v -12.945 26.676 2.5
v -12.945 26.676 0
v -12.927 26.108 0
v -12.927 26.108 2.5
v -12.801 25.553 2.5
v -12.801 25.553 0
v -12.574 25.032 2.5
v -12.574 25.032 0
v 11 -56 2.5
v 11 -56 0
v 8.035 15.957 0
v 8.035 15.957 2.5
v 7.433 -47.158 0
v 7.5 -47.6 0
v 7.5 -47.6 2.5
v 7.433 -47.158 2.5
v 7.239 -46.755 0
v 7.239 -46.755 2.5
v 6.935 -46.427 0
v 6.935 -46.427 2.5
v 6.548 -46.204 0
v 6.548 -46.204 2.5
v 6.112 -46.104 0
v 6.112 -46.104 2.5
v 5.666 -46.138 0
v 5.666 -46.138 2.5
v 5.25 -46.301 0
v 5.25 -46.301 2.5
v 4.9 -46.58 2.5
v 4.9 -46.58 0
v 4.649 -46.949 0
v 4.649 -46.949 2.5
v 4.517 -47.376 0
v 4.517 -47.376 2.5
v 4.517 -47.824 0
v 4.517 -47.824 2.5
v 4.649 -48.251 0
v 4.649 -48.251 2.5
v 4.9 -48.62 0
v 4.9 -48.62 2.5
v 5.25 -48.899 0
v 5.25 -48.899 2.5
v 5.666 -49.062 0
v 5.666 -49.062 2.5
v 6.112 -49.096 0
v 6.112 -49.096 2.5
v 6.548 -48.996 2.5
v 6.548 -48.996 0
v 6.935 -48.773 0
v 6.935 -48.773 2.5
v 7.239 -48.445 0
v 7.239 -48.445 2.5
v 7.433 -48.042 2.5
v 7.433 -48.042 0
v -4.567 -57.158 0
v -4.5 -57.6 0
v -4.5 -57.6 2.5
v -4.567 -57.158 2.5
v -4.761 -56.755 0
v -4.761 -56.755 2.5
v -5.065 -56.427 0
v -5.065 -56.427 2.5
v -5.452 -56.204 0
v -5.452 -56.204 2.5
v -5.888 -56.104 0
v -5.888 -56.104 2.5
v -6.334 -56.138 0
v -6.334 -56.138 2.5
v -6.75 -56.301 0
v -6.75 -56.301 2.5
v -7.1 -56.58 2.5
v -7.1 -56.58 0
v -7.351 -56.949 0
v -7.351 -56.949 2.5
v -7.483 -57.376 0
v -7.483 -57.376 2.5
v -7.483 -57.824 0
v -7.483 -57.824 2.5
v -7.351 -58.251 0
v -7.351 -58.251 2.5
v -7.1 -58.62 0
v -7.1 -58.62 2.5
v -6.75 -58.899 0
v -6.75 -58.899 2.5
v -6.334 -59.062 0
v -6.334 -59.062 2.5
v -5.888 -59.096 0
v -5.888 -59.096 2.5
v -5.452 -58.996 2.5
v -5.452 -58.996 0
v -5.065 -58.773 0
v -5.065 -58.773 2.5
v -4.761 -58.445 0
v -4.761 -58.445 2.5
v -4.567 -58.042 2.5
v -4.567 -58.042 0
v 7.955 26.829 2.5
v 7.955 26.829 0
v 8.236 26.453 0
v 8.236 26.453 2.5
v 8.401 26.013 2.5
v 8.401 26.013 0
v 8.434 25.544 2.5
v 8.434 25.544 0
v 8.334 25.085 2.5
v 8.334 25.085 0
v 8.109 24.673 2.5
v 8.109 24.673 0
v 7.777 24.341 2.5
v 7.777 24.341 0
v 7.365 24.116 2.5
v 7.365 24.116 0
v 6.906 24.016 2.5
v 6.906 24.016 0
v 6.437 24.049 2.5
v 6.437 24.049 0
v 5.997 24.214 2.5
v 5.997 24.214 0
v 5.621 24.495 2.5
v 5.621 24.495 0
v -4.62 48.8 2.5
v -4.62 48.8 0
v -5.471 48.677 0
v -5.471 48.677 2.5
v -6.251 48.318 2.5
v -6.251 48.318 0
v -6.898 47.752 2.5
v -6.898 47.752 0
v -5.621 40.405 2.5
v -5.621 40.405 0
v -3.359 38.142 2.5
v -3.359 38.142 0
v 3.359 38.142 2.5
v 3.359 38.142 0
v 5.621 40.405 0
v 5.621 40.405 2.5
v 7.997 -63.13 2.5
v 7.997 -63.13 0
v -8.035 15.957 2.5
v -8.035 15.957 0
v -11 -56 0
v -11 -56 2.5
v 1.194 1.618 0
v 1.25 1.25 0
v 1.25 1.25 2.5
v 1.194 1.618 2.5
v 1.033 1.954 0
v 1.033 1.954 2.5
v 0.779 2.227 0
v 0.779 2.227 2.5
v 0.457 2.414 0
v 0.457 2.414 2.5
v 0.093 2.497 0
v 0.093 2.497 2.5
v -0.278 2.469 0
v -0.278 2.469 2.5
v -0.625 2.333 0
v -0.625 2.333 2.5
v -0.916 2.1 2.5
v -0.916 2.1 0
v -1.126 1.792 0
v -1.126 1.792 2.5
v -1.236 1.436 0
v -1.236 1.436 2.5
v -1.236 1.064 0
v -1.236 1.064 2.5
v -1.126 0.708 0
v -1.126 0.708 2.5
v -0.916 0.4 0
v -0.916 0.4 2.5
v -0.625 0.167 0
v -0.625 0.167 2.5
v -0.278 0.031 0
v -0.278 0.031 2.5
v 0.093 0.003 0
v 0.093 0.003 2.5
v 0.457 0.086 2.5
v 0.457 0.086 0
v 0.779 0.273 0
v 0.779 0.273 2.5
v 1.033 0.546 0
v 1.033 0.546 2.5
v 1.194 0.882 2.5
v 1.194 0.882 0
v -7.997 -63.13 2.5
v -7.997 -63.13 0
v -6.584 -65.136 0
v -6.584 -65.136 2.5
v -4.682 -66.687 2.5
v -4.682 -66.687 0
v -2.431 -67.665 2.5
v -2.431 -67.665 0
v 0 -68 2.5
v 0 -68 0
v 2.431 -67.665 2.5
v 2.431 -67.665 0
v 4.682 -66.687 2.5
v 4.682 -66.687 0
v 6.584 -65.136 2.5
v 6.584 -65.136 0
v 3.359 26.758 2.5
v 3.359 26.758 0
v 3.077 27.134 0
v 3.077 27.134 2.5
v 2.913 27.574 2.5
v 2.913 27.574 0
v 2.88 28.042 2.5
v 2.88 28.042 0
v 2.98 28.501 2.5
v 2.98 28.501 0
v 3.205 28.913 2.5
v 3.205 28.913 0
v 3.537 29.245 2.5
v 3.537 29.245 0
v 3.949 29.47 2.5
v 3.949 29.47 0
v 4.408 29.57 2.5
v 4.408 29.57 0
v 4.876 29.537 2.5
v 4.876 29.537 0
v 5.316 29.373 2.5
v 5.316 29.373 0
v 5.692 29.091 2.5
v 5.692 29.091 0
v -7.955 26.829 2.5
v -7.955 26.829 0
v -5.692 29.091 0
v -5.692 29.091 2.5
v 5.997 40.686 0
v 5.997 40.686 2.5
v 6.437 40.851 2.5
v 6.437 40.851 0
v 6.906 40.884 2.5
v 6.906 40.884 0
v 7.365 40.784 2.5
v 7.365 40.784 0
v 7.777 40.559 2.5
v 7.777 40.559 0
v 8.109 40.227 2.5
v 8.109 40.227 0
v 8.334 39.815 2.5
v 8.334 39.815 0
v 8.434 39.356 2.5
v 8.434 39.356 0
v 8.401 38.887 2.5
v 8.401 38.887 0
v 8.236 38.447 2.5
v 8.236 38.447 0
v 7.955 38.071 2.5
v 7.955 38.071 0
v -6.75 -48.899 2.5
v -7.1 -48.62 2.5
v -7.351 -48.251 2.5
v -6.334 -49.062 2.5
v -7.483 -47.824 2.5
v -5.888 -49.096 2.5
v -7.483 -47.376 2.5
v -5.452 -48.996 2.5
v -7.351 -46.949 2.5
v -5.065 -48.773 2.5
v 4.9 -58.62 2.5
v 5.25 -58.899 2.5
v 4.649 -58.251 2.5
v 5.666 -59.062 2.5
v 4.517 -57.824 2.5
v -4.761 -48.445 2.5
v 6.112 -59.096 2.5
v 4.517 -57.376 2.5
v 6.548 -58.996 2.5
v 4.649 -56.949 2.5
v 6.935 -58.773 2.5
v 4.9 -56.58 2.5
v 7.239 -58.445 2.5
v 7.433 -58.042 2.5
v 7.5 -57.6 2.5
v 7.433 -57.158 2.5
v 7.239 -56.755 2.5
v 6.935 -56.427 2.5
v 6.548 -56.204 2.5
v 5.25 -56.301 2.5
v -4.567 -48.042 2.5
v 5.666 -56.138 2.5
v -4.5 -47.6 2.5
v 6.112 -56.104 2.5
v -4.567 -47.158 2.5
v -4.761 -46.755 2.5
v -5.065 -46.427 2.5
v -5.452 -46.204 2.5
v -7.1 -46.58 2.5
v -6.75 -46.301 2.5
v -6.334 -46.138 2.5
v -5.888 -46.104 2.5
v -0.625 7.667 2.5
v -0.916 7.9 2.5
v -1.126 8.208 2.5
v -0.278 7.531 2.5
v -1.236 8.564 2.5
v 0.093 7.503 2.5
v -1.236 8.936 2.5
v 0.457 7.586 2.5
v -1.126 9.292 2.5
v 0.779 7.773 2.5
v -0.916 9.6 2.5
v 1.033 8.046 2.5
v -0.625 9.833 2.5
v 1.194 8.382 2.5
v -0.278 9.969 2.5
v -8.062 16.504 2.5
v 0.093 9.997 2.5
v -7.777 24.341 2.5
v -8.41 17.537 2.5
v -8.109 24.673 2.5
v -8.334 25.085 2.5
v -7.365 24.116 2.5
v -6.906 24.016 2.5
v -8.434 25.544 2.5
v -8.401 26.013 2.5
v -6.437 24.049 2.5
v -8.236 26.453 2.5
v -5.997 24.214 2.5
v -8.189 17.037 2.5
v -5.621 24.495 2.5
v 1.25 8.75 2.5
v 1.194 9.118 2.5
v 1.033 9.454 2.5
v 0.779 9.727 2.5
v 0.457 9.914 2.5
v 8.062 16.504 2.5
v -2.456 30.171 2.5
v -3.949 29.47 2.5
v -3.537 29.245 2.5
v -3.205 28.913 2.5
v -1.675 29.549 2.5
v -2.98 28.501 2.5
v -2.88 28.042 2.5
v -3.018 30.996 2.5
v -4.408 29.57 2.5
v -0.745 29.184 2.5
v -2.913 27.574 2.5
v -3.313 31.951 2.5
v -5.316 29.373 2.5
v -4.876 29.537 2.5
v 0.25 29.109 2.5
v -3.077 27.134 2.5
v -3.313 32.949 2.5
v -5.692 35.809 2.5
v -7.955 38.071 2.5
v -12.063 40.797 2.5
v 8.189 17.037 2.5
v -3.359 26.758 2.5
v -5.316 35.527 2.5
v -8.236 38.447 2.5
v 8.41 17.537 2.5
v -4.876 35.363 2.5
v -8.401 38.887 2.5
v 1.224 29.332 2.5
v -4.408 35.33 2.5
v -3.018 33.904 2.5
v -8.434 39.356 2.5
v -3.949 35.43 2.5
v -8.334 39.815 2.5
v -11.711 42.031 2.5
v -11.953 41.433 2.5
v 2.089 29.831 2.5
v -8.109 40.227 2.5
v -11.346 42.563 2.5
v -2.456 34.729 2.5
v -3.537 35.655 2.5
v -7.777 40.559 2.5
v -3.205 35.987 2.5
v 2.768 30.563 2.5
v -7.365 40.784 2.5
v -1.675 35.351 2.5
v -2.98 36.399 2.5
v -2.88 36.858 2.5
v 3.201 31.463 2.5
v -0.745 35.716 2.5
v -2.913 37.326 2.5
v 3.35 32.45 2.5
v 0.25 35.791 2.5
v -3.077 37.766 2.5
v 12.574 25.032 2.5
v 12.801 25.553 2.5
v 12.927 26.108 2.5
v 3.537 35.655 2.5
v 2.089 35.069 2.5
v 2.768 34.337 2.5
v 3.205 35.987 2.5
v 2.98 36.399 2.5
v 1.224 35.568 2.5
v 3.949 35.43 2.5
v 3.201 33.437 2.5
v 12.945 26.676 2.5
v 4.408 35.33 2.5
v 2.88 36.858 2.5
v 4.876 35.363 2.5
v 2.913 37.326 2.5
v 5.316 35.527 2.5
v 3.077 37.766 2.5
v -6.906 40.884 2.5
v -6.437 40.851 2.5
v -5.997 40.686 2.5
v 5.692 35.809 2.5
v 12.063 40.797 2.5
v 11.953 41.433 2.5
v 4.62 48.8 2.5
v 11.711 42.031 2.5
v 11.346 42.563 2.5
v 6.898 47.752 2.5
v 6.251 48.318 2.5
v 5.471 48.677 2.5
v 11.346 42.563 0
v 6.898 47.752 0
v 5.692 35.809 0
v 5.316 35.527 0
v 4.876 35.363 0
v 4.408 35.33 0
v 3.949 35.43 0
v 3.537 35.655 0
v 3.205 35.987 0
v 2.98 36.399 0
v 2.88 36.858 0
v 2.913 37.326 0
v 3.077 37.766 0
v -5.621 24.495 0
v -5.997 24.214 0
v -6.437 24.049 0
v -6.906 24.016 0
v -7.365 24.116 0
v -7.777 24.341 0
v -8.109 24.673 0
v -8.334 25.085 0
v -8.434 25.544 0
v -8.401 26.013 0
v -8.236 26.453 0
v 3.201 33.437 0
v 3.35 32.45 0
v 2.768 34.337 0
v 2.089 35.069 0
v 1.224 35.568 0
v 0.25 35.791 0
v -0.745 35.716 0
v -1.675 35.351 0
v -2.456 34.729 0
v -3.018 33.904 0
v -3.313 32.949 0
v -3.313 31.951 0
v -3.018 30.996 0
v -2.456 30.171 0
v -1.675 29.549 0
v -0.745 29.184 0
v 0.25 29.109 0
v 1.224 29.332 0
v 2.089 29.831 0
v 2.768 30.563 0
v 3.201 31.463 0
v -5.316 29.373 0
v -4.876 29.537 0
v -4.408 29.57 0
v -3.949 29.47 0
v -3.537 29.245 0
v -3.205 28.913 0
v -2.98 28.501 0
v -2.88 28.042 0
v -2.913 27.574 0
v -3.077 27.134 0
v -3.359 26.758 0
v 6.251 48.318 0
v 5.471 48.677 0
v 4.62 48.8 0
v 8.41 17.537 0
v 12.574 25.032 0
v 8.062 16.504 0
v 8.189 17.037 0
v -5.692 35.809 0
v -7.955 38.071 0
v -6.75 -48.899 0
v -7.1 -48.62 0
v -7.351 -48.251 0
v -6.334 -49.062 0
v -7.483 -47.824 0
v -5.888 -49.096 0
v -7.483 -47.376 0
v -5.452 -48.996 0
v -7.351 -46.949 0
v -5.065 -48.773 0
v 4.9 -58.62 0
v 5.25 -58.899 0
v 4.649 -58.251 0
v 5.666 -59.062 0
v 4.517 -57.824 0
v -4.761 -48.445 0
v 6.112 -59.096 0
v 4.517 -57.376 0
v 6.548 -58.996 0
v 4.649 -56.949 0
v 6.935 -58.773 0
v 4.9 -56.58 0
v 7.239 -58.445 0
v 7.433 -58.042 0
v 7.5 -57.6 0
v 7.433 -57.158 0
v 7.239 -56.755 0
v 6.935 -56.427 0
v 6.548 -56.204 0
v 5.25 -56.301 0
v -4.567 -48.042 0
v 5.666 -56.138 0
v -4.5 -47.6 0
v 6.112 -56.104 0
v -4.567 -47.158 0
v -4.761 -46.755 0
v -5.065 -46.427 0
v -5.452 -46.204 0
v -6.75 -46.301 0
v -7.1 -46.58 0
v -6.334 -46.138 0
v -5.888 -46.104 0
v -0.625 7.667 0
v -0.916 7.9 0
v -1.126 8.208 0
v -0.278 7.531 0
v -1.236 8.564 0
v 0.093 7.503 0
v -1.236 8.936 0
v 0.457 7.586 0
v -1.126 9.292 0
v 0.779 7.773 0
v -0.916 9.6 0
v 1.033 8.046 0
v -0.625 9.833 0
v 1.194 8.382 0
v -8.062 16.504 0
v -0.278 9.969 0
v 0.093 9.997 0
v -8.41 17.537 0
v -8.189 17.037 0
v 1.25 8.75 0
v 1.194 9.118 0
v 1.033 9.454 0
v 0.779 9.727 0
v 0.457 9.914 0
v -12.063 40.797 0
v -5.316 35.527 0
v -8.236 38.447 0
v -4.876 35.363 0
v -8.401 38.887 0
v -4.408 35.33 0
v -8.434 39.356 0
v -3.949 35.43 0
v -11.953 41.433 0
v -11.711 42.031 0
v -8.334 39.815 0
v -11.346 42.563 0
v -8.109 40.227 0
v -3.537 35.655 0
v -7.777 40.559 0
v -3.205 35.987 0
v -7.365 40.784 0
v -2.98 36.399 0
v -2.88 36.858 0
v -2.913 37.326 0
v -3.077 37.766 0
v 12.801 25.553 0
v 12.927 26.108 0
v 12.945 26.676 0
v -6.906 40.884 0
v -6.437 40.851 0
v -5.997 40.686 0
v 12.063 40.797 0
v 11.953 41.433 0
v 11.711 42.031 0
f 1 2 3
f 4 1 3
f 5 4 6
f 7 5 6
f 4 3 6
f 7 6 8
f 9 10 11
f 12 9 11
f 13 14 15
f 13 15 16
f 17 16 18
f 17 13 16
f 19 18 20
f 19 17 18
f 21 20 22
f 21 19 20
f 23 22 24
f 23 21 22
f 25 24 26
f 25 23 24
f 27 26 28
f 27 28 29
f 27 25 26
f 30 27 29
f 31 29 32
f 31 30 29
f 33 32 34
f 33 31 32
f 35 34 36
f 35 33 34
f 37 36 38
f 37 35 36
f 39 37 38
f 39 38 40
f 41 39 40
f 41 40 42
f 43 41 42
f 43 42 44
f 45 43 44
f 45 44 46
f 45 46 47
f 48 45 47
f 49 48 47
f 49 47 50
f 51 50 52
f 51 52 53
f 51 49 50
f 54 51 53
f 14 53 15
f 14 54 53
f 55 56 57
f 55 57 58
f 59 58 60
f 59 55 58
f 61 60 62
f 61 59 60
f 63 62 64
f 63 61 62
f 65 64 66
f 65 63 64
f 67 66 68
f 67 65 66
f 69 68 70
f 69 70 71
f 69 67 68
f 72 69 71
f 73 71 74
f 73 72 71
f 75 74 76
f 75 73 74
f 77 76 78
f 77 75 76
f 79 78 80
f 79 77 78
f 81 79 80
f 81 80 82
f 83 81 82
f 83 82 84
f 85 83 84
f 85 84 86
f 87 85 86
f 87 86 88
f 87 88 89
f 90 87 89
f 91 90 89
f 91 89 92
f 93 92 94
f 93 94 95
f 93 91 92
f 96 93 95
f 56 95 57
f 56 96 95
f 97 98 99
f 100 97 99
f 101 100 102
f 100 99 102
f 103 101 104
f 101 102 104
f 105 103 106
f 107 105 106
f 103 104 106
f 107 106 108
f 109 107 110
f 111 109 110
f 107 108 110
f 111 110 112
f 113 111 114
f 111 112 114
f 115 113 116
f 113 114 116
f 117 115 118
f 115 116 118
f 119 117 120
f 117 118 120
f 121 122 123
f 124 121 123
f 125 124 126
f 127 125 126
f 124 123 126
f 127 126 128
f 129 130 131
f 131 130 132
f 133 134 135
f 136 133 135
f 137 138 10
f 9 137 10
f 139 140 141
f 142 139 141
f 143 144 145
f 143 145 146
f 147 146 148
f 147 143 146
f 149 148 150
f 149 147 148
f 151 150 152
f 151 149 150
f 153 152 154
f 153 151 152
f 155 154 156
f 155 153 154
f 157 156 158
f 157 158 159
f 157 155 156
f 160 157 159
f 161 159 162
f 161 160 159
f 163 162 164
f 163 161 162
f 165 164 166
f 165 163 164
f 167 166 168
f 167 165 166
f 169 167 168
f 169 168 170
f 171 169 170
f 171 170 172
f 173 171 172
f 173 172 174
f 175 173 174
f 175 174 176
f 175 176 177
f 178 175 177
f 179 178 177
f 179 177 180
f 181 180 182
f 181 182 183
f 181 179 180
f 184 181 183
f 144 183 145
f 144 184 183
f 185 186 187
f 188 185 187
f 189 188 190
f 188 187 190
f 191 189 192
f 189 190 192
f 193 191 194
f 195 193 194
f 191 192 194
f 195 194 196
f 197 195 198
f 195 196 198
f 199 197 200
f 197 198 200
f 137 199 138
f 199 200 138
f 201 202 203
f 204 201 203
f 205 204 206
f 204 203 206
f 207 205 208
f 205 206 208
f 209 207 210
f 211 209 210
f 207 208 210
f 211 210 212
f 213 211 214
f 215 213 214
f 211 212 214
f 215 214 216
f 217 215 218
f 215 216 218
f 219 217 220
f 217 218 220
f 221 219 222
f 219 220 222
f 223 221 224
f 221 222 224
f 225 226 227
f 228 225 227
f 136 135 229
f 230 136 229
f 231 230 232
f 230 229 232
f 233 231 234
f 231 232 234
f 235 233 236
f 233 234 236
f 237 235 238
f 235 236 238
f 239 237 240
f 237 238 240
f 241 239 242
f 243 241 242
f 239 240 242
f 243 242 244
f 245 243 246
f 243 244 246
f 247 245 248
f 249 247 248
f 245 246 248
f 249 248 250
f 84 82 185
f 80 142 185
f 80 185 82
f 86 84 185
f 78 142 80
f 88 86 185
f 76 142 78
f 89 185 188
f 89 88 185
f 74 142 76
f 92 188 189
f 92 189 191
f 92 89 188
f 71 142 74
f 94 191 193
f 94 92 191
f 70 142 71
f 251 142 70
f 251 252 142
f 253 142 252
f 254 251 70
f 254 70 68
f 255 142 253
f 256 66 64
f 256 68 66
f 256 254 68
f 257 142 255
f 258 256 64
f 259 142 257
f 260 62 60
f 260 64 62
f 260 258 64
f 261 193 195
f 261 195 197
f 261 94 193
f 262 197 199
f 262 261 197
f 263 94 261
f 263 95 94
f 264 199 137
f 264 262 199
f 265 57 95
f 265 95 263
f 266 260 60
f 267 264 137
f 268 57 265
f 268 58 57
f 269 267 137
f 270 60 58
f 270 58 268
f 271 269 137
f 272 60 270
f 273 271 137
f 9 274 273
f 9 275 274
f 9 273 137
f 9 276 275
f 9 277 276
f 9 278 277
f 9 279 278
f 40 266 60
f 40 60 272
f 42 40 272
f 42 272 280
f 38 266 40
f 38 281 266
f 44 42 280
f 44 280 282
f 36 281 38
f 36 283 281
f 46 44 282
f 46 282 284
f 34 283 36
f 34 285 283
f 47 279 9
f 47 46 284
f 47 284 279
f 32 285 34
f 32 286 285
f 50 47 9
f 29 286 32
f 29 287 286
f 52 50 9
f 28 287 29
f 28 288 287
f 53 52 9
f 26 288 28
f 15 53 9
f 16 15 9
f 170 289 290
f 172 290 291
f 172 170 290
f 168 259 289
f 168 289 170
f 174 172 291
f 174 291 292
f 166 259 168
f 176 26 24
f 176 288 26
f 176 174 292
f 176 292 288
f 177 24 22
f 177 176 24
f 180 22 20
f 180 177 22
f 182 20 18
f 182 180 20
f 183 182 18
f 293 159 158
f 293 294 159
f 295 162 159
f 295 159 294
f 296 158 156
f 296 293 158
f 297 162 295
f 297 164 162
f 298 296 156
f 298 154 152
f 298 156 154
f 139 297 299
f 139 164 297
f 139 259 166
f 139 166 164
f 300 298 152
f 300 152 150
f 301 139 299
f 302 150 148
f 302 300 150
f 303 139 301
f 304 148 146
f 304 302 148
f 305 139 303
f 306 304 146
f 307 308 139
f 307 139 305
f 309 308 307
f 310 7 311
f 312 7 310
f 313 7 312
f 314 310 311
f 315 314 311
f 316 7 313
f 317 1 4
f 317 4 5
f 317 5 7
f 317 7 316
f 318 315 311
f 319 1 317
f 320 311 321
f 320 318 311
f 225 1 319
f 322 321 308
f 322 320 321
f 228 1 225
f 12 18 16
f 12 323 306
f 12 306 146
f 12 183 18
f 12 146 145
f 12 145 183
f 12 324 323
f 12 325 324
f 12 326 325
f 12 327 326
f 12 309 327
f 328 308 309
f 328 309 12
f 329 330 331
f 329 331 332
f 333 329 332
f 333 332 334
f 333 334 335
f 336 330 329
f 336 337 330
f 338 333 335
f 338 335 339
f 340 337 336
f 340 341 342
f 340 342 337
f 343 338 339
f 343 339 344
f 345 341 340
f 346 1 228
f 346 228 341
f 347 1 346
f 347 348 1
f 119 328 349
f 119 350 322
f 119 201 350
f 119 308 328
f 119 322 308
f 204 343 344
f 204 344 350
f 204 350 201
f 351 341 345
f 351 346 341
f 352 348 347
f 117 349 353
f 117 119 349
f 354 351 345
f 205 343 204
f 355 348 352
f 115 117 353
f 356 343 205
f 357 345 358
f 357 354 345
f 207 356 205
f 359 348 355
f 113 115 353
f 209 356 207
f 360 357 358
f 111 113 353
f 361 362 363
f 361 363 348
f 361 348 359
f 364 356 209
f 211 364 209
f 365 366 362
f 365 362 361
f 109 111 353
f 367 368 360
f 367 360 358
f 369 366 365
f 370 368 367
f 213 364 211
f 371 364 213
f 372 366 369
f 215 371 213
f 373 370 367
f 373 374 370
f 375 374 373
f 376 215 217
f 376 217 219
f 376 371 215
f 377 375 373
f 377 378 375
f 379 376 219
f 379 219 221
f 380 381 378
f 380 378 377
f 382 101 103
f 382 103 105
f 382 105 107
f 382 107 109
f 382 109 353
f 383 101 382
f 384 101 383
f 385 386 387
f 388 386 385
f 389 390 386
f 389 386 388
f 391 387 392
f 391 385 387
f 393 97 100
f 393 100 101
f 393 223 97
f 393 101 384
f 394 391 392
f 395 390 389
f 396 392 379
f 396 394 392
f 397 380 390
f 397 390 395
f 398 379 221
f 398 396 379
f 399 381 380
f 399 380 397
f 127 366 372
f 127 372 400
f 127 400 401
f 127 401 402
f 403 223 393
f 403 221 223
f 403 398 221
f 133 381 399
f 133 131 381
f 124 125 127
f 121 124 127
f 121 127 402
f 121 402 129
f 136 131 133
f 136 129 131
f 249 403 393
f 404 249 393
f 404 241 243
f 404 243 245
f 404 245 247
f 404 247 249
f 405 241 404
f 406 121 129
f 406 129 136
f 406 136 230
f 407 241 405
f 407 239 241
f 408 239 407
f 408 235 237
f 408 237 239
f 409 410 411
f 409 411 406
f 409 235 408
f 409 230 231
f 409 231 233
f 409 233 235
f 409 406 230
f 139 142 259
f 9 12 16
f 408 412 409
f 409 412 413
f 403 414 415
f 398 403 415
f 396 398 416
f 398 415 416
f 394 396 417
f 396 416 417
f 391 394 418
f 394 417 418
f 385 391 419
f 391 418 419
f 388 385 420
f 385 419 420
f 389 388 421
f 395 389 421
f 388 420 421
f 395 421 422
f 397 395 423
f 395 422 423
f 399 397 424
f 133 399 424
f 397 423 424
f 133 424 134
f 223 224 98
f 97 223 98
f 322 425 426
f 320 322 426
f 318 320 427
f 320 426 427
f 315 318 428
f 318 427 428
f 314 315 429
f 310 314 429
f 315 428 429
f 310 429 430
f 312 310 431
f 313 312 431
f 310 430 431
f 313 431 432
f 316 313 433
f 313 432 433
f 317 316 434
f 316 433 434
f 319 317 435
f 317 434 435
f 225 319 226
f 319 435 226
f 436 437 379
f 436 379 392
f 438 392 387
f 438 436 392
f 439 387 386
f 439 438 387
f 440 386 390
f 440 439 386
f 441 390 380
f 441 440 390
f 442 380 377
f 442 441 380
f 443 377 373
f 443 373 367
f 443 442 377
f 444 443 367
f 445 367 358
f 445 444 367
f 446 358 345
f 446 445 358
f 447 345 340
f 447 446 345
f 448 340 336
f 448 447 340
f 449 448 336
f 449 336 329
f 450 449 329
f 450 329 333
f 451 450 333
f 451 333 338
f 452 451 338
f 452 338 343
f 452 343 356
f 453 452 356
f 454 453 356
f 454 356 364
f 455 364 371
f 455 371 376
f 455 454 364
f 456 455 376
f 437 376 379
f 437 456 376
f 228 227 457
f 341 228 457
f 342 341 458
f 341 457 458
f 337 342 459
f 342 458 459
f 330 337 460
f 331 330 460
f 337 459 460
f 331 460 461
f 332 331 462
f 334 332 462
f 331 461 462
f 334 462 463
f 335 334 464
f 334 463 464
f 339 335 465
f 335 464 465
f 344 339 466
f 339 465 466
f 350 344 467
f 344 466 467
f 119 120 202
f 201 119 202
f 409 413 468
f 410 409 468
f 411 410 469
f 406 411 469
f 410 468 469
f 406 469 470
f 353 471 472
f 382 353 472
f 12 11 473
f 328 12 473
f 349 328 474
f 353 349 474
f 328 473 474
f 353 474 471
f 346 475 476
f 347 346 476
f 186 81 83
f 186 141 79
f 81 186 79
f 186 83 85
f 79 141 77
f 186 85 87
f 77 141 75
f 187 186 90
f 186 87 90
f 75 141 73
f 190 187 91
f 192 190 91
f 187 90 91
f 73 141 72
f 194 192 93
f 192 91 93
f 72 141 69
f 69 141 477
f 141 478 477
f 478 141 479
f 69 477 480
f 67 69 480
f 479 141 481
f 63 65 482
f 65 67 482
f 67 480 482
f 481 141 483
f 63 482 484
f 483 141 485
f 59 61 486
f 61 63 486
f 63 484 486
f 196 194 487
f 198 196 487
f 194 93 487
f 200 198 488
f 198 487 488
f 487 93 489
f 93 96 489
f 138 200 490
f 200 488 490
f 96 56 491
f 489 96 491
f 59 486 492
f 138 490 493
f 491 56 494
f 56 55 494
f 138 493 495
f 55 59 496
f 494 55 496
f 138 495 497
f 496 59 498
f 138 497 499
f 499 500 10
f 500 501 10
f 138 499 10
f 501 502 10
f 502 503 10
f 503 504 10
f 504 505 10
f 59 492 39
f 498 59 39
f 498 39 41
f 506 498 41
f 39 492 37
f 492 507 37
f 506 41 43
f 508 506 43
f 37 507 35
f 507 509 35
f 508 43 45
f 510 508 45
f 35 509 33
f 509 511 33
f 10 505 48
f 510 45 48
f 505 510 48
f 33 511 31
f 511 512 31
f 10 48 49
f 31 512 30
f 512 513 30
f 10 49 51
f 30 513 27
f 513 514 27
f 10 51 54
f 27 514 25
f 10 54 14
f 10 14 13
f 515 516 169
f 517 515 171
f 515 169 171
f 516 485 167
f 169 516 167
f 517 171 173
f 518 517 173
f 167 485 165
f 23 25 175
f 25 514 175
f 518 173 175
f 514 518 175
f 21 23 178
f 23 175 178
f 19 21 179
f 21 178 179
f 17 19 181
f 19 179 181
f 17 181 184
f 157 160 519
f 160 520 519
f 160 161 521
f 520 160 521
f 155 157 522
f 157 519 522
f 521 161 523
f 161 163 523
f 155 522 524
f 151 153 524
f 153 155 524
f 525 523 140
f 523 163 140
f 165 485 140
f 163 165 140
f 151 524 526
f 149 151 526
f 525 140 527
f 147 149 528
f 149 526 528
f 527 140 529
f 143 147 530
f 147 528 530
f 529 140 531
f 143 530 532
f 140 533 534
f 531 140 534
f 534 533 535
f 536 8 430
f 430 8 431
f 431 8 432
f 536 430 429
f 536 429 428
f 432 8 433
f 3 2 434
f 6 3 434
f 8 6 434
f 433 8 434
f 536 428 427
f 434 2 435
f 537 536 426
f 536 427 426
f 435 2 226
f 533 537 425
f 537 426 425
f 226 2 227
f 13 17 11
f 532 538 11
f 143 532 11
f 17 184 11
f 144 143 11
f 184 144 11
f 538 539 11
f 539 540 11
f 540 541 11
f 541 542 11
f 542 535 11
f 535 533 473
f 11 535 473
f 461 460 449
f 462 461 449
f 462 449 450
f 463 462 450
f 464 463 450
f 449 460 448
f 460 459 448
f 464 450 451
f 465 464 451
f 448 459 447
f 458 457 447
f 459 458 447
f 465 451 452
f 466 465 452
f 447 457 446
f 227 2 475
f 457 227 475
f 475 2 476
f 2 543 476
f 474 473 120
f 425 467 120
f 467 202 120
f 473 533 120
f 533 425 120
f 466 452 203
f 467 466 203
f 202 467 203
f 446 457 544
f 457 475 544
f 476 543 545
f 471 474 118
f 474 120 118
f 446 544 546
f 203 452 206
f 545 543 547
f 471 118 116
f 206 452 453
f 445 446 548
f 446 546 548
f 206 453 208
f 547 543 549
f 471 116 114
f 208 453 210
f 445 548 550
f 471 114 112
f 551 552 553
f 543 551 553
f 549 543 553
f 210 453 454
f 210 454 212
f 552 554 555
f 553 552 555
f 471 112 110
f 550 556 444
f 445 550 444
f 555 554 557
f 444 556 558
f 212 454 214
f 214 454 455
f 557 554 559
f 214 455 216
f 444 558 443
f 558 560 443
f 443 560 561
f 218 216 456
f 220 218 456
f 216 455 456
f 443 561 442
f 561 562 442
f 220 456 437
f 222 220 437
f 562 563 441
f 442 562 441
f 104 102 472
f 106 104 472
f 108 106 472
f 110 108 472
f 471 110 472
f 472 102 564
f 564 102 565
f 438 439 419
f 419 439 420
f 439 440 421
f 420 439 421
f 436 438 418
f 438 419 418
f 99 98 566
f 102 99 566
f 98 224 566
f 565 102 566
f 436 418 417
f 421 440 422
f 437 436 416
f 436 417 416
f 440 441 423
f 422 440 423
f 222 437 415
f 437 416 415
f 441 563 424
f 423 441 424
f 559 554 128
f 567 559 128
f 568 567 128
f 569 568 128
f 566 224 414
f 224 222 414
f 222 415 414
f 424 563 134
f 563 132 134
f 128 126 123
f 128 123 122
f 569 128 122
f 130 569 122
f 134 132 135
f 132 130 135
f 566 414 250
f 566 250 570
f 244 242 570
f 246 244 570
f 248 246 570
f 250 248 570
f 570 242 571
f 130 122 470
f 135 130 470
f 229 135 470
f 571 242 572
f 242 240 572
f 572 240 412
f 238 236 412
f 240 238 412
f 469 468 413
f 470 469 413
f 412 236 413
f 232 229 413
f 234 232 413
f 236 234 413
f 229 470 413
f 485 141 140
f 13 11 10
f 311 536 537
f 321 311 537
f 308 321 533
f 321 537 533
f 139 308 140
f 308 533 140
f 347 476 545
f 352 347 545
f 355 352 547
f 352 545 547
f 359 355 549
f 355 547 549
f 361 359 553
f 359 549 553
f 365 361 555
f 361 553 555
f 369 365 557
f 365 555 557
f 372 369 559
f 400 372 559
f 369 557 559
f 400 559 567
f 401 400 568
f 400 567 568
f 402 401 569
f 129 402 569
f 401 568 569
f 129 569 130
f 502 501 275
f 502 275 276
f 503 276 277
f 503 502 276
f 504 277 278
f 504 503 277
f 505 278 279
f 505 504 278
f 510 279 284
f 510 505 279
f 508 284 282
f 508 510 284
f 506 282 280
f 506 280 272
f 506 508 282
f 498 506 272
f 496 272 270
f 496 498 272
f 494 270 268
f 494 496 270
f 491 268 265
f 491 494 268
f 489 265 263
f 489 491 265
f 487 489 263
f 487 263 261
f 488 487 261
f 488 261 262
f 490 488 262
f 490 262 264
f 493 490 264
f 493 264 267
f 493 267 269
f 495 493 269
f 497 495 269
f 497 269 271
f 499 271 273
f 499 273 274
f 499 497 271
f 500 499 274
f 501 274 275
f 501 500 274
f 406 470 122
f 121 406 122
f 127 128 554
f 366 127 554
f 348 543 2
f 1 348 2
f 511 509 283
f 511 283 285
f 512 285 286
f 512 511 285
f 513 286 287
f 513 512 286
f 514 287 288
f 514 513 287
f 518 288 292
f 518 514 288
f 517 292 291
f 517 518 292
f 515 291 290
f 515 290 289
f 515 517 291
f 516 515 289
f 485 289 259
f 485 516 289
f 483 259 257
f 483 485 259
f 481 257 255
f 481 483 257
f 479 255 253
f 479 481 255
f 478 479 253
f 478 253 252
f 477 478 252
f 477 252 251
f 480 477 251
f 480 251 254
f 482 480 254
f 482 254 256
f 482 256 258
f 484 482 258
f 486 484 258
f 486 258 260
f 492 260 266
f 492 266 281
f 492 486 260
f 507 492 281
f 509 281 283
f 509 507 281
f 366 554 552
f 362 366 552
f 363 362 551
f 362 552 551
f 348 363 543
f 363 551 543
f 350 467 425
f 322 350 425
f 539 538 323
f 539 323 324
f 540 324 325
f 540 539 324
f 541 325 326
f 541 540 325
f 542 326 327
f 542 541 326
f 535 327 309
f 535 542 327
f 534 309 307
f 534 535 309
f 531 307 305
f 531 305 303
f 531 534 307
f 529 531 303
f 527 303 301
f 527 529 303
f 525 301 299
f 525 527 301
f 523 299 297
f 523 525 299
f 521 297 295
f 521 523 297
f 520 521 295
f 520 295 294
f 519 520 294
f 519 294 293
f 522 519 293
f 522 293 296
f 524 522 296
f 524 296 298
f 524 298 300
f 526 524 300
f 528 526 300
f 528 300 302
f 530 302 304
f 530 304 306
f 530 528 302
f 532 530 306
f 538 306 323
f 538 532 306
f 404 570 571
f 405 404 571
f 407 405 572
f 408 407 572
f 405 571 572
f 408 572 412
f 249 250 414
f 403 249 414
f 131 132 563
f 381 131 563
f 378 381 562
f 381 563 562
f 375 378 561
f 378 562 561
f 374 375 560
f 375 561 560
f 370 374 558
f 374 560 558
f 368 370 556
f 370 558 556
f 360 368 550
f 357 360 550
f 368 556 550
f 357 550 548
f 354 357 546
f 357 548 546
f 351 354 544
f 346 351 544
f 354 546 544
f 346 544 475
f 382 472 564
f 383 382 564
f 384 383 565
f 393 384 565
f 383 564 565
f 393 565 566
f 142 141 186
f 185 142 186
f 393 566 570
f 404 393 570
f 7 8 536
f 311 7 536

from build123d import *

# Parameters (mm, degrees)
F0_R     = 1.5
F0_R_2   = 1.25
F0_R_3   = 3.35
F1_DEPTH = 2.5


with BuildPart() as f1:
    # F0 (on Top) → F1 (new body)
    with BuildSketch(Plane.XY):
        with BuildLine():
            Line((-8.0347370397, 15.957047836), (-11, -56))
            Line((-11, -56), (-7.9966708881, -63.1295586577))
            ThreePointArc((-7.9966708881, -63.1295586577), (0, -68), (7.9966708881, -63.1295586577))
            Line((7.9966708881, -63.1295586577), (11, -56))
            Line((11, -56), (8.0347370397, 15.957047836))
            ThreePointArc((8.0347370397, 15.957047836), (8.1132286629, 16.7731349004), (8.4097212043, 17.5374981677))
            Line((8.4097212043, 17.5374981677), (12.5735371817, 25.0323669271))
            ThreePointArc((12.5735371817, 25.0323669271), (12.8772178164, 25.8277582971), (12.9452230888, 26.6764305791))
            Line((12.9452230888, 26.6764305791), (12.0626597761, 40.7974435824))
            ThreePointArc((12.0626597761, 40.7974435824), (11.8483082239, 41.738438851), (11.3462718477, 42.5626828443))
            Line((11.3462718477, 42.5626828443), (6.8979650397, 47.7523741204))
            ThreePointArc((6.8979650397, 47.7523741204), (5.8737656612, 48.5255386955), (4.6201952326, 48.8))
            Line((4.6201952326, 48.8), (-4.6201952326, 48.8))
            ThreePointArc((-4.6201952326, 48.8), (-5.8737656612, 48.5255386955), (-6.8979650397, 47.7523741204))
            Line((-6.8979650397, 47.7523741204), (-11.3462718477, 42.5626828443))
            ThreePointArc((-11.3462718477, 42.5626828443), (-11.8483082239, 41.738438851), (-12.0626597761, 40.7974435824))
            Line((-12.0626597761, 40.7974435824), (-12.9452230888, 26.6764305791))
            ThreePointArc((-12.9452230888, 26.6764305791), (-12.8772178164, 25.8277582971), (-12.5735371817, 25.0323669271))
            Line((-12.5735371817, 25.0323669271), (-8.4097212043, 17.5374981677))
            ThreePointArc((-8.4097212043, 17.5374981677), (-8.1132286629, 16.7731349004), (-8.0347370397, 15.957047836))
        make_face()
        with Locations((-6, -57.6)):
            Circle(F0_R, mode=Mode.SUBTRACT)
        with Locations((-6, -47.6)):
            Circle(F0_R, mode=Mode.SUBTRACT)
        with Locations((6, -57.6)):
            Circle(F0_R, mode=Mode.SUBTRACT)
        with Locations((6, -47.6)):
            Circle(F0_R, mode=Mode.SUBTRACT)
        with Locations((0, 1.25)):
            Circle(F0_R_2, mode=Mode.SUBTRACT)
        with Locations((0, 8.75)):
            Circle(F0_R_2, mode=Mode.SUBTRACT)
        with BuildLine():
            Line((-7.9549512883, 26.8285010896), (-5.6922095886, 29.0912427894))
            ThreePointArc((-5.6922095886, 29.0912427894), (-3.3587572106, 29.0912427894), (-3.3587572106, 26.7577904114))
            Line((-3.3587572106, 26.7577904114), (-5.6214989104, 24.4950487117))
            ThreePointArc((-5.6214989104, 24.4950487117), (-7.9549512883, 24.4950487117), (-7.9549512883, 26.8285010896))
        make_face(mode=Mode.SUBTRACT)
        with Locations((0, 32.45)):
            Circle(F0_R_3, mode=Mode.SUBTRACT)
        with BuildLine():
            Line((-5.6214989104, 40.4049512883), (-3.3587572106, 38.1422095886))
            ThreePointArc((-3.3587572106, 38.1422095886), (-3.3587572106, 35.8087572106), (-5.6922095886, 35.8087572106))
            Line((-5.6922095886, 35.8087572106), (-7.9549512883, 38.0714989104))
            ThreePointArc((-7.9549512883, 38.0714989104), (-7.9549512883, 40.4049512883), (-5.6214989104, 40.4049512883))
        make_face(mode=Mode.SUBTRACT)
        with BuildLine():
            Line((5.6214989104, 24.4950487117), (3.3587572106, 26.7577904114))
            ThreePointArc((3.3587572106, 26.7577904114), (3.3587572106, 29.0912427894), (5.6922095886, 29.0912427894))
            Line((5.6922095886, 29.0912427894), (7.9549512883, 26.8285010896))
            ThreePointArc((7.9549512883, 26.8285010896), (7.9549512883, 24.4950487117), (5.6214989104, 24.4950487117))
        make_face(mode=Mode.SUBTRACT)
        with BuildLine():
            Line((7.9549512883, 38.0714989104), (5.6922095886, 35.8087572106))
            ThreePointArc((5.6922095886, 35.8087572106), (3.3587572106, 35.8087572106), (3.3587572106, 38.1422095886))
            Line((3.3587572106, 38.1422095886), (5.6214989104, 40.4049512883))
            ThreePointArc((5.6214989104, 40.4049512883), (7.9549512883, 40.4049512883), (7.9549512883, 38.0714989104))
        make_face(mode=Mode.SUBTRACT)
    extrude(amount=F1_DEPTH)


solid = f1.part
